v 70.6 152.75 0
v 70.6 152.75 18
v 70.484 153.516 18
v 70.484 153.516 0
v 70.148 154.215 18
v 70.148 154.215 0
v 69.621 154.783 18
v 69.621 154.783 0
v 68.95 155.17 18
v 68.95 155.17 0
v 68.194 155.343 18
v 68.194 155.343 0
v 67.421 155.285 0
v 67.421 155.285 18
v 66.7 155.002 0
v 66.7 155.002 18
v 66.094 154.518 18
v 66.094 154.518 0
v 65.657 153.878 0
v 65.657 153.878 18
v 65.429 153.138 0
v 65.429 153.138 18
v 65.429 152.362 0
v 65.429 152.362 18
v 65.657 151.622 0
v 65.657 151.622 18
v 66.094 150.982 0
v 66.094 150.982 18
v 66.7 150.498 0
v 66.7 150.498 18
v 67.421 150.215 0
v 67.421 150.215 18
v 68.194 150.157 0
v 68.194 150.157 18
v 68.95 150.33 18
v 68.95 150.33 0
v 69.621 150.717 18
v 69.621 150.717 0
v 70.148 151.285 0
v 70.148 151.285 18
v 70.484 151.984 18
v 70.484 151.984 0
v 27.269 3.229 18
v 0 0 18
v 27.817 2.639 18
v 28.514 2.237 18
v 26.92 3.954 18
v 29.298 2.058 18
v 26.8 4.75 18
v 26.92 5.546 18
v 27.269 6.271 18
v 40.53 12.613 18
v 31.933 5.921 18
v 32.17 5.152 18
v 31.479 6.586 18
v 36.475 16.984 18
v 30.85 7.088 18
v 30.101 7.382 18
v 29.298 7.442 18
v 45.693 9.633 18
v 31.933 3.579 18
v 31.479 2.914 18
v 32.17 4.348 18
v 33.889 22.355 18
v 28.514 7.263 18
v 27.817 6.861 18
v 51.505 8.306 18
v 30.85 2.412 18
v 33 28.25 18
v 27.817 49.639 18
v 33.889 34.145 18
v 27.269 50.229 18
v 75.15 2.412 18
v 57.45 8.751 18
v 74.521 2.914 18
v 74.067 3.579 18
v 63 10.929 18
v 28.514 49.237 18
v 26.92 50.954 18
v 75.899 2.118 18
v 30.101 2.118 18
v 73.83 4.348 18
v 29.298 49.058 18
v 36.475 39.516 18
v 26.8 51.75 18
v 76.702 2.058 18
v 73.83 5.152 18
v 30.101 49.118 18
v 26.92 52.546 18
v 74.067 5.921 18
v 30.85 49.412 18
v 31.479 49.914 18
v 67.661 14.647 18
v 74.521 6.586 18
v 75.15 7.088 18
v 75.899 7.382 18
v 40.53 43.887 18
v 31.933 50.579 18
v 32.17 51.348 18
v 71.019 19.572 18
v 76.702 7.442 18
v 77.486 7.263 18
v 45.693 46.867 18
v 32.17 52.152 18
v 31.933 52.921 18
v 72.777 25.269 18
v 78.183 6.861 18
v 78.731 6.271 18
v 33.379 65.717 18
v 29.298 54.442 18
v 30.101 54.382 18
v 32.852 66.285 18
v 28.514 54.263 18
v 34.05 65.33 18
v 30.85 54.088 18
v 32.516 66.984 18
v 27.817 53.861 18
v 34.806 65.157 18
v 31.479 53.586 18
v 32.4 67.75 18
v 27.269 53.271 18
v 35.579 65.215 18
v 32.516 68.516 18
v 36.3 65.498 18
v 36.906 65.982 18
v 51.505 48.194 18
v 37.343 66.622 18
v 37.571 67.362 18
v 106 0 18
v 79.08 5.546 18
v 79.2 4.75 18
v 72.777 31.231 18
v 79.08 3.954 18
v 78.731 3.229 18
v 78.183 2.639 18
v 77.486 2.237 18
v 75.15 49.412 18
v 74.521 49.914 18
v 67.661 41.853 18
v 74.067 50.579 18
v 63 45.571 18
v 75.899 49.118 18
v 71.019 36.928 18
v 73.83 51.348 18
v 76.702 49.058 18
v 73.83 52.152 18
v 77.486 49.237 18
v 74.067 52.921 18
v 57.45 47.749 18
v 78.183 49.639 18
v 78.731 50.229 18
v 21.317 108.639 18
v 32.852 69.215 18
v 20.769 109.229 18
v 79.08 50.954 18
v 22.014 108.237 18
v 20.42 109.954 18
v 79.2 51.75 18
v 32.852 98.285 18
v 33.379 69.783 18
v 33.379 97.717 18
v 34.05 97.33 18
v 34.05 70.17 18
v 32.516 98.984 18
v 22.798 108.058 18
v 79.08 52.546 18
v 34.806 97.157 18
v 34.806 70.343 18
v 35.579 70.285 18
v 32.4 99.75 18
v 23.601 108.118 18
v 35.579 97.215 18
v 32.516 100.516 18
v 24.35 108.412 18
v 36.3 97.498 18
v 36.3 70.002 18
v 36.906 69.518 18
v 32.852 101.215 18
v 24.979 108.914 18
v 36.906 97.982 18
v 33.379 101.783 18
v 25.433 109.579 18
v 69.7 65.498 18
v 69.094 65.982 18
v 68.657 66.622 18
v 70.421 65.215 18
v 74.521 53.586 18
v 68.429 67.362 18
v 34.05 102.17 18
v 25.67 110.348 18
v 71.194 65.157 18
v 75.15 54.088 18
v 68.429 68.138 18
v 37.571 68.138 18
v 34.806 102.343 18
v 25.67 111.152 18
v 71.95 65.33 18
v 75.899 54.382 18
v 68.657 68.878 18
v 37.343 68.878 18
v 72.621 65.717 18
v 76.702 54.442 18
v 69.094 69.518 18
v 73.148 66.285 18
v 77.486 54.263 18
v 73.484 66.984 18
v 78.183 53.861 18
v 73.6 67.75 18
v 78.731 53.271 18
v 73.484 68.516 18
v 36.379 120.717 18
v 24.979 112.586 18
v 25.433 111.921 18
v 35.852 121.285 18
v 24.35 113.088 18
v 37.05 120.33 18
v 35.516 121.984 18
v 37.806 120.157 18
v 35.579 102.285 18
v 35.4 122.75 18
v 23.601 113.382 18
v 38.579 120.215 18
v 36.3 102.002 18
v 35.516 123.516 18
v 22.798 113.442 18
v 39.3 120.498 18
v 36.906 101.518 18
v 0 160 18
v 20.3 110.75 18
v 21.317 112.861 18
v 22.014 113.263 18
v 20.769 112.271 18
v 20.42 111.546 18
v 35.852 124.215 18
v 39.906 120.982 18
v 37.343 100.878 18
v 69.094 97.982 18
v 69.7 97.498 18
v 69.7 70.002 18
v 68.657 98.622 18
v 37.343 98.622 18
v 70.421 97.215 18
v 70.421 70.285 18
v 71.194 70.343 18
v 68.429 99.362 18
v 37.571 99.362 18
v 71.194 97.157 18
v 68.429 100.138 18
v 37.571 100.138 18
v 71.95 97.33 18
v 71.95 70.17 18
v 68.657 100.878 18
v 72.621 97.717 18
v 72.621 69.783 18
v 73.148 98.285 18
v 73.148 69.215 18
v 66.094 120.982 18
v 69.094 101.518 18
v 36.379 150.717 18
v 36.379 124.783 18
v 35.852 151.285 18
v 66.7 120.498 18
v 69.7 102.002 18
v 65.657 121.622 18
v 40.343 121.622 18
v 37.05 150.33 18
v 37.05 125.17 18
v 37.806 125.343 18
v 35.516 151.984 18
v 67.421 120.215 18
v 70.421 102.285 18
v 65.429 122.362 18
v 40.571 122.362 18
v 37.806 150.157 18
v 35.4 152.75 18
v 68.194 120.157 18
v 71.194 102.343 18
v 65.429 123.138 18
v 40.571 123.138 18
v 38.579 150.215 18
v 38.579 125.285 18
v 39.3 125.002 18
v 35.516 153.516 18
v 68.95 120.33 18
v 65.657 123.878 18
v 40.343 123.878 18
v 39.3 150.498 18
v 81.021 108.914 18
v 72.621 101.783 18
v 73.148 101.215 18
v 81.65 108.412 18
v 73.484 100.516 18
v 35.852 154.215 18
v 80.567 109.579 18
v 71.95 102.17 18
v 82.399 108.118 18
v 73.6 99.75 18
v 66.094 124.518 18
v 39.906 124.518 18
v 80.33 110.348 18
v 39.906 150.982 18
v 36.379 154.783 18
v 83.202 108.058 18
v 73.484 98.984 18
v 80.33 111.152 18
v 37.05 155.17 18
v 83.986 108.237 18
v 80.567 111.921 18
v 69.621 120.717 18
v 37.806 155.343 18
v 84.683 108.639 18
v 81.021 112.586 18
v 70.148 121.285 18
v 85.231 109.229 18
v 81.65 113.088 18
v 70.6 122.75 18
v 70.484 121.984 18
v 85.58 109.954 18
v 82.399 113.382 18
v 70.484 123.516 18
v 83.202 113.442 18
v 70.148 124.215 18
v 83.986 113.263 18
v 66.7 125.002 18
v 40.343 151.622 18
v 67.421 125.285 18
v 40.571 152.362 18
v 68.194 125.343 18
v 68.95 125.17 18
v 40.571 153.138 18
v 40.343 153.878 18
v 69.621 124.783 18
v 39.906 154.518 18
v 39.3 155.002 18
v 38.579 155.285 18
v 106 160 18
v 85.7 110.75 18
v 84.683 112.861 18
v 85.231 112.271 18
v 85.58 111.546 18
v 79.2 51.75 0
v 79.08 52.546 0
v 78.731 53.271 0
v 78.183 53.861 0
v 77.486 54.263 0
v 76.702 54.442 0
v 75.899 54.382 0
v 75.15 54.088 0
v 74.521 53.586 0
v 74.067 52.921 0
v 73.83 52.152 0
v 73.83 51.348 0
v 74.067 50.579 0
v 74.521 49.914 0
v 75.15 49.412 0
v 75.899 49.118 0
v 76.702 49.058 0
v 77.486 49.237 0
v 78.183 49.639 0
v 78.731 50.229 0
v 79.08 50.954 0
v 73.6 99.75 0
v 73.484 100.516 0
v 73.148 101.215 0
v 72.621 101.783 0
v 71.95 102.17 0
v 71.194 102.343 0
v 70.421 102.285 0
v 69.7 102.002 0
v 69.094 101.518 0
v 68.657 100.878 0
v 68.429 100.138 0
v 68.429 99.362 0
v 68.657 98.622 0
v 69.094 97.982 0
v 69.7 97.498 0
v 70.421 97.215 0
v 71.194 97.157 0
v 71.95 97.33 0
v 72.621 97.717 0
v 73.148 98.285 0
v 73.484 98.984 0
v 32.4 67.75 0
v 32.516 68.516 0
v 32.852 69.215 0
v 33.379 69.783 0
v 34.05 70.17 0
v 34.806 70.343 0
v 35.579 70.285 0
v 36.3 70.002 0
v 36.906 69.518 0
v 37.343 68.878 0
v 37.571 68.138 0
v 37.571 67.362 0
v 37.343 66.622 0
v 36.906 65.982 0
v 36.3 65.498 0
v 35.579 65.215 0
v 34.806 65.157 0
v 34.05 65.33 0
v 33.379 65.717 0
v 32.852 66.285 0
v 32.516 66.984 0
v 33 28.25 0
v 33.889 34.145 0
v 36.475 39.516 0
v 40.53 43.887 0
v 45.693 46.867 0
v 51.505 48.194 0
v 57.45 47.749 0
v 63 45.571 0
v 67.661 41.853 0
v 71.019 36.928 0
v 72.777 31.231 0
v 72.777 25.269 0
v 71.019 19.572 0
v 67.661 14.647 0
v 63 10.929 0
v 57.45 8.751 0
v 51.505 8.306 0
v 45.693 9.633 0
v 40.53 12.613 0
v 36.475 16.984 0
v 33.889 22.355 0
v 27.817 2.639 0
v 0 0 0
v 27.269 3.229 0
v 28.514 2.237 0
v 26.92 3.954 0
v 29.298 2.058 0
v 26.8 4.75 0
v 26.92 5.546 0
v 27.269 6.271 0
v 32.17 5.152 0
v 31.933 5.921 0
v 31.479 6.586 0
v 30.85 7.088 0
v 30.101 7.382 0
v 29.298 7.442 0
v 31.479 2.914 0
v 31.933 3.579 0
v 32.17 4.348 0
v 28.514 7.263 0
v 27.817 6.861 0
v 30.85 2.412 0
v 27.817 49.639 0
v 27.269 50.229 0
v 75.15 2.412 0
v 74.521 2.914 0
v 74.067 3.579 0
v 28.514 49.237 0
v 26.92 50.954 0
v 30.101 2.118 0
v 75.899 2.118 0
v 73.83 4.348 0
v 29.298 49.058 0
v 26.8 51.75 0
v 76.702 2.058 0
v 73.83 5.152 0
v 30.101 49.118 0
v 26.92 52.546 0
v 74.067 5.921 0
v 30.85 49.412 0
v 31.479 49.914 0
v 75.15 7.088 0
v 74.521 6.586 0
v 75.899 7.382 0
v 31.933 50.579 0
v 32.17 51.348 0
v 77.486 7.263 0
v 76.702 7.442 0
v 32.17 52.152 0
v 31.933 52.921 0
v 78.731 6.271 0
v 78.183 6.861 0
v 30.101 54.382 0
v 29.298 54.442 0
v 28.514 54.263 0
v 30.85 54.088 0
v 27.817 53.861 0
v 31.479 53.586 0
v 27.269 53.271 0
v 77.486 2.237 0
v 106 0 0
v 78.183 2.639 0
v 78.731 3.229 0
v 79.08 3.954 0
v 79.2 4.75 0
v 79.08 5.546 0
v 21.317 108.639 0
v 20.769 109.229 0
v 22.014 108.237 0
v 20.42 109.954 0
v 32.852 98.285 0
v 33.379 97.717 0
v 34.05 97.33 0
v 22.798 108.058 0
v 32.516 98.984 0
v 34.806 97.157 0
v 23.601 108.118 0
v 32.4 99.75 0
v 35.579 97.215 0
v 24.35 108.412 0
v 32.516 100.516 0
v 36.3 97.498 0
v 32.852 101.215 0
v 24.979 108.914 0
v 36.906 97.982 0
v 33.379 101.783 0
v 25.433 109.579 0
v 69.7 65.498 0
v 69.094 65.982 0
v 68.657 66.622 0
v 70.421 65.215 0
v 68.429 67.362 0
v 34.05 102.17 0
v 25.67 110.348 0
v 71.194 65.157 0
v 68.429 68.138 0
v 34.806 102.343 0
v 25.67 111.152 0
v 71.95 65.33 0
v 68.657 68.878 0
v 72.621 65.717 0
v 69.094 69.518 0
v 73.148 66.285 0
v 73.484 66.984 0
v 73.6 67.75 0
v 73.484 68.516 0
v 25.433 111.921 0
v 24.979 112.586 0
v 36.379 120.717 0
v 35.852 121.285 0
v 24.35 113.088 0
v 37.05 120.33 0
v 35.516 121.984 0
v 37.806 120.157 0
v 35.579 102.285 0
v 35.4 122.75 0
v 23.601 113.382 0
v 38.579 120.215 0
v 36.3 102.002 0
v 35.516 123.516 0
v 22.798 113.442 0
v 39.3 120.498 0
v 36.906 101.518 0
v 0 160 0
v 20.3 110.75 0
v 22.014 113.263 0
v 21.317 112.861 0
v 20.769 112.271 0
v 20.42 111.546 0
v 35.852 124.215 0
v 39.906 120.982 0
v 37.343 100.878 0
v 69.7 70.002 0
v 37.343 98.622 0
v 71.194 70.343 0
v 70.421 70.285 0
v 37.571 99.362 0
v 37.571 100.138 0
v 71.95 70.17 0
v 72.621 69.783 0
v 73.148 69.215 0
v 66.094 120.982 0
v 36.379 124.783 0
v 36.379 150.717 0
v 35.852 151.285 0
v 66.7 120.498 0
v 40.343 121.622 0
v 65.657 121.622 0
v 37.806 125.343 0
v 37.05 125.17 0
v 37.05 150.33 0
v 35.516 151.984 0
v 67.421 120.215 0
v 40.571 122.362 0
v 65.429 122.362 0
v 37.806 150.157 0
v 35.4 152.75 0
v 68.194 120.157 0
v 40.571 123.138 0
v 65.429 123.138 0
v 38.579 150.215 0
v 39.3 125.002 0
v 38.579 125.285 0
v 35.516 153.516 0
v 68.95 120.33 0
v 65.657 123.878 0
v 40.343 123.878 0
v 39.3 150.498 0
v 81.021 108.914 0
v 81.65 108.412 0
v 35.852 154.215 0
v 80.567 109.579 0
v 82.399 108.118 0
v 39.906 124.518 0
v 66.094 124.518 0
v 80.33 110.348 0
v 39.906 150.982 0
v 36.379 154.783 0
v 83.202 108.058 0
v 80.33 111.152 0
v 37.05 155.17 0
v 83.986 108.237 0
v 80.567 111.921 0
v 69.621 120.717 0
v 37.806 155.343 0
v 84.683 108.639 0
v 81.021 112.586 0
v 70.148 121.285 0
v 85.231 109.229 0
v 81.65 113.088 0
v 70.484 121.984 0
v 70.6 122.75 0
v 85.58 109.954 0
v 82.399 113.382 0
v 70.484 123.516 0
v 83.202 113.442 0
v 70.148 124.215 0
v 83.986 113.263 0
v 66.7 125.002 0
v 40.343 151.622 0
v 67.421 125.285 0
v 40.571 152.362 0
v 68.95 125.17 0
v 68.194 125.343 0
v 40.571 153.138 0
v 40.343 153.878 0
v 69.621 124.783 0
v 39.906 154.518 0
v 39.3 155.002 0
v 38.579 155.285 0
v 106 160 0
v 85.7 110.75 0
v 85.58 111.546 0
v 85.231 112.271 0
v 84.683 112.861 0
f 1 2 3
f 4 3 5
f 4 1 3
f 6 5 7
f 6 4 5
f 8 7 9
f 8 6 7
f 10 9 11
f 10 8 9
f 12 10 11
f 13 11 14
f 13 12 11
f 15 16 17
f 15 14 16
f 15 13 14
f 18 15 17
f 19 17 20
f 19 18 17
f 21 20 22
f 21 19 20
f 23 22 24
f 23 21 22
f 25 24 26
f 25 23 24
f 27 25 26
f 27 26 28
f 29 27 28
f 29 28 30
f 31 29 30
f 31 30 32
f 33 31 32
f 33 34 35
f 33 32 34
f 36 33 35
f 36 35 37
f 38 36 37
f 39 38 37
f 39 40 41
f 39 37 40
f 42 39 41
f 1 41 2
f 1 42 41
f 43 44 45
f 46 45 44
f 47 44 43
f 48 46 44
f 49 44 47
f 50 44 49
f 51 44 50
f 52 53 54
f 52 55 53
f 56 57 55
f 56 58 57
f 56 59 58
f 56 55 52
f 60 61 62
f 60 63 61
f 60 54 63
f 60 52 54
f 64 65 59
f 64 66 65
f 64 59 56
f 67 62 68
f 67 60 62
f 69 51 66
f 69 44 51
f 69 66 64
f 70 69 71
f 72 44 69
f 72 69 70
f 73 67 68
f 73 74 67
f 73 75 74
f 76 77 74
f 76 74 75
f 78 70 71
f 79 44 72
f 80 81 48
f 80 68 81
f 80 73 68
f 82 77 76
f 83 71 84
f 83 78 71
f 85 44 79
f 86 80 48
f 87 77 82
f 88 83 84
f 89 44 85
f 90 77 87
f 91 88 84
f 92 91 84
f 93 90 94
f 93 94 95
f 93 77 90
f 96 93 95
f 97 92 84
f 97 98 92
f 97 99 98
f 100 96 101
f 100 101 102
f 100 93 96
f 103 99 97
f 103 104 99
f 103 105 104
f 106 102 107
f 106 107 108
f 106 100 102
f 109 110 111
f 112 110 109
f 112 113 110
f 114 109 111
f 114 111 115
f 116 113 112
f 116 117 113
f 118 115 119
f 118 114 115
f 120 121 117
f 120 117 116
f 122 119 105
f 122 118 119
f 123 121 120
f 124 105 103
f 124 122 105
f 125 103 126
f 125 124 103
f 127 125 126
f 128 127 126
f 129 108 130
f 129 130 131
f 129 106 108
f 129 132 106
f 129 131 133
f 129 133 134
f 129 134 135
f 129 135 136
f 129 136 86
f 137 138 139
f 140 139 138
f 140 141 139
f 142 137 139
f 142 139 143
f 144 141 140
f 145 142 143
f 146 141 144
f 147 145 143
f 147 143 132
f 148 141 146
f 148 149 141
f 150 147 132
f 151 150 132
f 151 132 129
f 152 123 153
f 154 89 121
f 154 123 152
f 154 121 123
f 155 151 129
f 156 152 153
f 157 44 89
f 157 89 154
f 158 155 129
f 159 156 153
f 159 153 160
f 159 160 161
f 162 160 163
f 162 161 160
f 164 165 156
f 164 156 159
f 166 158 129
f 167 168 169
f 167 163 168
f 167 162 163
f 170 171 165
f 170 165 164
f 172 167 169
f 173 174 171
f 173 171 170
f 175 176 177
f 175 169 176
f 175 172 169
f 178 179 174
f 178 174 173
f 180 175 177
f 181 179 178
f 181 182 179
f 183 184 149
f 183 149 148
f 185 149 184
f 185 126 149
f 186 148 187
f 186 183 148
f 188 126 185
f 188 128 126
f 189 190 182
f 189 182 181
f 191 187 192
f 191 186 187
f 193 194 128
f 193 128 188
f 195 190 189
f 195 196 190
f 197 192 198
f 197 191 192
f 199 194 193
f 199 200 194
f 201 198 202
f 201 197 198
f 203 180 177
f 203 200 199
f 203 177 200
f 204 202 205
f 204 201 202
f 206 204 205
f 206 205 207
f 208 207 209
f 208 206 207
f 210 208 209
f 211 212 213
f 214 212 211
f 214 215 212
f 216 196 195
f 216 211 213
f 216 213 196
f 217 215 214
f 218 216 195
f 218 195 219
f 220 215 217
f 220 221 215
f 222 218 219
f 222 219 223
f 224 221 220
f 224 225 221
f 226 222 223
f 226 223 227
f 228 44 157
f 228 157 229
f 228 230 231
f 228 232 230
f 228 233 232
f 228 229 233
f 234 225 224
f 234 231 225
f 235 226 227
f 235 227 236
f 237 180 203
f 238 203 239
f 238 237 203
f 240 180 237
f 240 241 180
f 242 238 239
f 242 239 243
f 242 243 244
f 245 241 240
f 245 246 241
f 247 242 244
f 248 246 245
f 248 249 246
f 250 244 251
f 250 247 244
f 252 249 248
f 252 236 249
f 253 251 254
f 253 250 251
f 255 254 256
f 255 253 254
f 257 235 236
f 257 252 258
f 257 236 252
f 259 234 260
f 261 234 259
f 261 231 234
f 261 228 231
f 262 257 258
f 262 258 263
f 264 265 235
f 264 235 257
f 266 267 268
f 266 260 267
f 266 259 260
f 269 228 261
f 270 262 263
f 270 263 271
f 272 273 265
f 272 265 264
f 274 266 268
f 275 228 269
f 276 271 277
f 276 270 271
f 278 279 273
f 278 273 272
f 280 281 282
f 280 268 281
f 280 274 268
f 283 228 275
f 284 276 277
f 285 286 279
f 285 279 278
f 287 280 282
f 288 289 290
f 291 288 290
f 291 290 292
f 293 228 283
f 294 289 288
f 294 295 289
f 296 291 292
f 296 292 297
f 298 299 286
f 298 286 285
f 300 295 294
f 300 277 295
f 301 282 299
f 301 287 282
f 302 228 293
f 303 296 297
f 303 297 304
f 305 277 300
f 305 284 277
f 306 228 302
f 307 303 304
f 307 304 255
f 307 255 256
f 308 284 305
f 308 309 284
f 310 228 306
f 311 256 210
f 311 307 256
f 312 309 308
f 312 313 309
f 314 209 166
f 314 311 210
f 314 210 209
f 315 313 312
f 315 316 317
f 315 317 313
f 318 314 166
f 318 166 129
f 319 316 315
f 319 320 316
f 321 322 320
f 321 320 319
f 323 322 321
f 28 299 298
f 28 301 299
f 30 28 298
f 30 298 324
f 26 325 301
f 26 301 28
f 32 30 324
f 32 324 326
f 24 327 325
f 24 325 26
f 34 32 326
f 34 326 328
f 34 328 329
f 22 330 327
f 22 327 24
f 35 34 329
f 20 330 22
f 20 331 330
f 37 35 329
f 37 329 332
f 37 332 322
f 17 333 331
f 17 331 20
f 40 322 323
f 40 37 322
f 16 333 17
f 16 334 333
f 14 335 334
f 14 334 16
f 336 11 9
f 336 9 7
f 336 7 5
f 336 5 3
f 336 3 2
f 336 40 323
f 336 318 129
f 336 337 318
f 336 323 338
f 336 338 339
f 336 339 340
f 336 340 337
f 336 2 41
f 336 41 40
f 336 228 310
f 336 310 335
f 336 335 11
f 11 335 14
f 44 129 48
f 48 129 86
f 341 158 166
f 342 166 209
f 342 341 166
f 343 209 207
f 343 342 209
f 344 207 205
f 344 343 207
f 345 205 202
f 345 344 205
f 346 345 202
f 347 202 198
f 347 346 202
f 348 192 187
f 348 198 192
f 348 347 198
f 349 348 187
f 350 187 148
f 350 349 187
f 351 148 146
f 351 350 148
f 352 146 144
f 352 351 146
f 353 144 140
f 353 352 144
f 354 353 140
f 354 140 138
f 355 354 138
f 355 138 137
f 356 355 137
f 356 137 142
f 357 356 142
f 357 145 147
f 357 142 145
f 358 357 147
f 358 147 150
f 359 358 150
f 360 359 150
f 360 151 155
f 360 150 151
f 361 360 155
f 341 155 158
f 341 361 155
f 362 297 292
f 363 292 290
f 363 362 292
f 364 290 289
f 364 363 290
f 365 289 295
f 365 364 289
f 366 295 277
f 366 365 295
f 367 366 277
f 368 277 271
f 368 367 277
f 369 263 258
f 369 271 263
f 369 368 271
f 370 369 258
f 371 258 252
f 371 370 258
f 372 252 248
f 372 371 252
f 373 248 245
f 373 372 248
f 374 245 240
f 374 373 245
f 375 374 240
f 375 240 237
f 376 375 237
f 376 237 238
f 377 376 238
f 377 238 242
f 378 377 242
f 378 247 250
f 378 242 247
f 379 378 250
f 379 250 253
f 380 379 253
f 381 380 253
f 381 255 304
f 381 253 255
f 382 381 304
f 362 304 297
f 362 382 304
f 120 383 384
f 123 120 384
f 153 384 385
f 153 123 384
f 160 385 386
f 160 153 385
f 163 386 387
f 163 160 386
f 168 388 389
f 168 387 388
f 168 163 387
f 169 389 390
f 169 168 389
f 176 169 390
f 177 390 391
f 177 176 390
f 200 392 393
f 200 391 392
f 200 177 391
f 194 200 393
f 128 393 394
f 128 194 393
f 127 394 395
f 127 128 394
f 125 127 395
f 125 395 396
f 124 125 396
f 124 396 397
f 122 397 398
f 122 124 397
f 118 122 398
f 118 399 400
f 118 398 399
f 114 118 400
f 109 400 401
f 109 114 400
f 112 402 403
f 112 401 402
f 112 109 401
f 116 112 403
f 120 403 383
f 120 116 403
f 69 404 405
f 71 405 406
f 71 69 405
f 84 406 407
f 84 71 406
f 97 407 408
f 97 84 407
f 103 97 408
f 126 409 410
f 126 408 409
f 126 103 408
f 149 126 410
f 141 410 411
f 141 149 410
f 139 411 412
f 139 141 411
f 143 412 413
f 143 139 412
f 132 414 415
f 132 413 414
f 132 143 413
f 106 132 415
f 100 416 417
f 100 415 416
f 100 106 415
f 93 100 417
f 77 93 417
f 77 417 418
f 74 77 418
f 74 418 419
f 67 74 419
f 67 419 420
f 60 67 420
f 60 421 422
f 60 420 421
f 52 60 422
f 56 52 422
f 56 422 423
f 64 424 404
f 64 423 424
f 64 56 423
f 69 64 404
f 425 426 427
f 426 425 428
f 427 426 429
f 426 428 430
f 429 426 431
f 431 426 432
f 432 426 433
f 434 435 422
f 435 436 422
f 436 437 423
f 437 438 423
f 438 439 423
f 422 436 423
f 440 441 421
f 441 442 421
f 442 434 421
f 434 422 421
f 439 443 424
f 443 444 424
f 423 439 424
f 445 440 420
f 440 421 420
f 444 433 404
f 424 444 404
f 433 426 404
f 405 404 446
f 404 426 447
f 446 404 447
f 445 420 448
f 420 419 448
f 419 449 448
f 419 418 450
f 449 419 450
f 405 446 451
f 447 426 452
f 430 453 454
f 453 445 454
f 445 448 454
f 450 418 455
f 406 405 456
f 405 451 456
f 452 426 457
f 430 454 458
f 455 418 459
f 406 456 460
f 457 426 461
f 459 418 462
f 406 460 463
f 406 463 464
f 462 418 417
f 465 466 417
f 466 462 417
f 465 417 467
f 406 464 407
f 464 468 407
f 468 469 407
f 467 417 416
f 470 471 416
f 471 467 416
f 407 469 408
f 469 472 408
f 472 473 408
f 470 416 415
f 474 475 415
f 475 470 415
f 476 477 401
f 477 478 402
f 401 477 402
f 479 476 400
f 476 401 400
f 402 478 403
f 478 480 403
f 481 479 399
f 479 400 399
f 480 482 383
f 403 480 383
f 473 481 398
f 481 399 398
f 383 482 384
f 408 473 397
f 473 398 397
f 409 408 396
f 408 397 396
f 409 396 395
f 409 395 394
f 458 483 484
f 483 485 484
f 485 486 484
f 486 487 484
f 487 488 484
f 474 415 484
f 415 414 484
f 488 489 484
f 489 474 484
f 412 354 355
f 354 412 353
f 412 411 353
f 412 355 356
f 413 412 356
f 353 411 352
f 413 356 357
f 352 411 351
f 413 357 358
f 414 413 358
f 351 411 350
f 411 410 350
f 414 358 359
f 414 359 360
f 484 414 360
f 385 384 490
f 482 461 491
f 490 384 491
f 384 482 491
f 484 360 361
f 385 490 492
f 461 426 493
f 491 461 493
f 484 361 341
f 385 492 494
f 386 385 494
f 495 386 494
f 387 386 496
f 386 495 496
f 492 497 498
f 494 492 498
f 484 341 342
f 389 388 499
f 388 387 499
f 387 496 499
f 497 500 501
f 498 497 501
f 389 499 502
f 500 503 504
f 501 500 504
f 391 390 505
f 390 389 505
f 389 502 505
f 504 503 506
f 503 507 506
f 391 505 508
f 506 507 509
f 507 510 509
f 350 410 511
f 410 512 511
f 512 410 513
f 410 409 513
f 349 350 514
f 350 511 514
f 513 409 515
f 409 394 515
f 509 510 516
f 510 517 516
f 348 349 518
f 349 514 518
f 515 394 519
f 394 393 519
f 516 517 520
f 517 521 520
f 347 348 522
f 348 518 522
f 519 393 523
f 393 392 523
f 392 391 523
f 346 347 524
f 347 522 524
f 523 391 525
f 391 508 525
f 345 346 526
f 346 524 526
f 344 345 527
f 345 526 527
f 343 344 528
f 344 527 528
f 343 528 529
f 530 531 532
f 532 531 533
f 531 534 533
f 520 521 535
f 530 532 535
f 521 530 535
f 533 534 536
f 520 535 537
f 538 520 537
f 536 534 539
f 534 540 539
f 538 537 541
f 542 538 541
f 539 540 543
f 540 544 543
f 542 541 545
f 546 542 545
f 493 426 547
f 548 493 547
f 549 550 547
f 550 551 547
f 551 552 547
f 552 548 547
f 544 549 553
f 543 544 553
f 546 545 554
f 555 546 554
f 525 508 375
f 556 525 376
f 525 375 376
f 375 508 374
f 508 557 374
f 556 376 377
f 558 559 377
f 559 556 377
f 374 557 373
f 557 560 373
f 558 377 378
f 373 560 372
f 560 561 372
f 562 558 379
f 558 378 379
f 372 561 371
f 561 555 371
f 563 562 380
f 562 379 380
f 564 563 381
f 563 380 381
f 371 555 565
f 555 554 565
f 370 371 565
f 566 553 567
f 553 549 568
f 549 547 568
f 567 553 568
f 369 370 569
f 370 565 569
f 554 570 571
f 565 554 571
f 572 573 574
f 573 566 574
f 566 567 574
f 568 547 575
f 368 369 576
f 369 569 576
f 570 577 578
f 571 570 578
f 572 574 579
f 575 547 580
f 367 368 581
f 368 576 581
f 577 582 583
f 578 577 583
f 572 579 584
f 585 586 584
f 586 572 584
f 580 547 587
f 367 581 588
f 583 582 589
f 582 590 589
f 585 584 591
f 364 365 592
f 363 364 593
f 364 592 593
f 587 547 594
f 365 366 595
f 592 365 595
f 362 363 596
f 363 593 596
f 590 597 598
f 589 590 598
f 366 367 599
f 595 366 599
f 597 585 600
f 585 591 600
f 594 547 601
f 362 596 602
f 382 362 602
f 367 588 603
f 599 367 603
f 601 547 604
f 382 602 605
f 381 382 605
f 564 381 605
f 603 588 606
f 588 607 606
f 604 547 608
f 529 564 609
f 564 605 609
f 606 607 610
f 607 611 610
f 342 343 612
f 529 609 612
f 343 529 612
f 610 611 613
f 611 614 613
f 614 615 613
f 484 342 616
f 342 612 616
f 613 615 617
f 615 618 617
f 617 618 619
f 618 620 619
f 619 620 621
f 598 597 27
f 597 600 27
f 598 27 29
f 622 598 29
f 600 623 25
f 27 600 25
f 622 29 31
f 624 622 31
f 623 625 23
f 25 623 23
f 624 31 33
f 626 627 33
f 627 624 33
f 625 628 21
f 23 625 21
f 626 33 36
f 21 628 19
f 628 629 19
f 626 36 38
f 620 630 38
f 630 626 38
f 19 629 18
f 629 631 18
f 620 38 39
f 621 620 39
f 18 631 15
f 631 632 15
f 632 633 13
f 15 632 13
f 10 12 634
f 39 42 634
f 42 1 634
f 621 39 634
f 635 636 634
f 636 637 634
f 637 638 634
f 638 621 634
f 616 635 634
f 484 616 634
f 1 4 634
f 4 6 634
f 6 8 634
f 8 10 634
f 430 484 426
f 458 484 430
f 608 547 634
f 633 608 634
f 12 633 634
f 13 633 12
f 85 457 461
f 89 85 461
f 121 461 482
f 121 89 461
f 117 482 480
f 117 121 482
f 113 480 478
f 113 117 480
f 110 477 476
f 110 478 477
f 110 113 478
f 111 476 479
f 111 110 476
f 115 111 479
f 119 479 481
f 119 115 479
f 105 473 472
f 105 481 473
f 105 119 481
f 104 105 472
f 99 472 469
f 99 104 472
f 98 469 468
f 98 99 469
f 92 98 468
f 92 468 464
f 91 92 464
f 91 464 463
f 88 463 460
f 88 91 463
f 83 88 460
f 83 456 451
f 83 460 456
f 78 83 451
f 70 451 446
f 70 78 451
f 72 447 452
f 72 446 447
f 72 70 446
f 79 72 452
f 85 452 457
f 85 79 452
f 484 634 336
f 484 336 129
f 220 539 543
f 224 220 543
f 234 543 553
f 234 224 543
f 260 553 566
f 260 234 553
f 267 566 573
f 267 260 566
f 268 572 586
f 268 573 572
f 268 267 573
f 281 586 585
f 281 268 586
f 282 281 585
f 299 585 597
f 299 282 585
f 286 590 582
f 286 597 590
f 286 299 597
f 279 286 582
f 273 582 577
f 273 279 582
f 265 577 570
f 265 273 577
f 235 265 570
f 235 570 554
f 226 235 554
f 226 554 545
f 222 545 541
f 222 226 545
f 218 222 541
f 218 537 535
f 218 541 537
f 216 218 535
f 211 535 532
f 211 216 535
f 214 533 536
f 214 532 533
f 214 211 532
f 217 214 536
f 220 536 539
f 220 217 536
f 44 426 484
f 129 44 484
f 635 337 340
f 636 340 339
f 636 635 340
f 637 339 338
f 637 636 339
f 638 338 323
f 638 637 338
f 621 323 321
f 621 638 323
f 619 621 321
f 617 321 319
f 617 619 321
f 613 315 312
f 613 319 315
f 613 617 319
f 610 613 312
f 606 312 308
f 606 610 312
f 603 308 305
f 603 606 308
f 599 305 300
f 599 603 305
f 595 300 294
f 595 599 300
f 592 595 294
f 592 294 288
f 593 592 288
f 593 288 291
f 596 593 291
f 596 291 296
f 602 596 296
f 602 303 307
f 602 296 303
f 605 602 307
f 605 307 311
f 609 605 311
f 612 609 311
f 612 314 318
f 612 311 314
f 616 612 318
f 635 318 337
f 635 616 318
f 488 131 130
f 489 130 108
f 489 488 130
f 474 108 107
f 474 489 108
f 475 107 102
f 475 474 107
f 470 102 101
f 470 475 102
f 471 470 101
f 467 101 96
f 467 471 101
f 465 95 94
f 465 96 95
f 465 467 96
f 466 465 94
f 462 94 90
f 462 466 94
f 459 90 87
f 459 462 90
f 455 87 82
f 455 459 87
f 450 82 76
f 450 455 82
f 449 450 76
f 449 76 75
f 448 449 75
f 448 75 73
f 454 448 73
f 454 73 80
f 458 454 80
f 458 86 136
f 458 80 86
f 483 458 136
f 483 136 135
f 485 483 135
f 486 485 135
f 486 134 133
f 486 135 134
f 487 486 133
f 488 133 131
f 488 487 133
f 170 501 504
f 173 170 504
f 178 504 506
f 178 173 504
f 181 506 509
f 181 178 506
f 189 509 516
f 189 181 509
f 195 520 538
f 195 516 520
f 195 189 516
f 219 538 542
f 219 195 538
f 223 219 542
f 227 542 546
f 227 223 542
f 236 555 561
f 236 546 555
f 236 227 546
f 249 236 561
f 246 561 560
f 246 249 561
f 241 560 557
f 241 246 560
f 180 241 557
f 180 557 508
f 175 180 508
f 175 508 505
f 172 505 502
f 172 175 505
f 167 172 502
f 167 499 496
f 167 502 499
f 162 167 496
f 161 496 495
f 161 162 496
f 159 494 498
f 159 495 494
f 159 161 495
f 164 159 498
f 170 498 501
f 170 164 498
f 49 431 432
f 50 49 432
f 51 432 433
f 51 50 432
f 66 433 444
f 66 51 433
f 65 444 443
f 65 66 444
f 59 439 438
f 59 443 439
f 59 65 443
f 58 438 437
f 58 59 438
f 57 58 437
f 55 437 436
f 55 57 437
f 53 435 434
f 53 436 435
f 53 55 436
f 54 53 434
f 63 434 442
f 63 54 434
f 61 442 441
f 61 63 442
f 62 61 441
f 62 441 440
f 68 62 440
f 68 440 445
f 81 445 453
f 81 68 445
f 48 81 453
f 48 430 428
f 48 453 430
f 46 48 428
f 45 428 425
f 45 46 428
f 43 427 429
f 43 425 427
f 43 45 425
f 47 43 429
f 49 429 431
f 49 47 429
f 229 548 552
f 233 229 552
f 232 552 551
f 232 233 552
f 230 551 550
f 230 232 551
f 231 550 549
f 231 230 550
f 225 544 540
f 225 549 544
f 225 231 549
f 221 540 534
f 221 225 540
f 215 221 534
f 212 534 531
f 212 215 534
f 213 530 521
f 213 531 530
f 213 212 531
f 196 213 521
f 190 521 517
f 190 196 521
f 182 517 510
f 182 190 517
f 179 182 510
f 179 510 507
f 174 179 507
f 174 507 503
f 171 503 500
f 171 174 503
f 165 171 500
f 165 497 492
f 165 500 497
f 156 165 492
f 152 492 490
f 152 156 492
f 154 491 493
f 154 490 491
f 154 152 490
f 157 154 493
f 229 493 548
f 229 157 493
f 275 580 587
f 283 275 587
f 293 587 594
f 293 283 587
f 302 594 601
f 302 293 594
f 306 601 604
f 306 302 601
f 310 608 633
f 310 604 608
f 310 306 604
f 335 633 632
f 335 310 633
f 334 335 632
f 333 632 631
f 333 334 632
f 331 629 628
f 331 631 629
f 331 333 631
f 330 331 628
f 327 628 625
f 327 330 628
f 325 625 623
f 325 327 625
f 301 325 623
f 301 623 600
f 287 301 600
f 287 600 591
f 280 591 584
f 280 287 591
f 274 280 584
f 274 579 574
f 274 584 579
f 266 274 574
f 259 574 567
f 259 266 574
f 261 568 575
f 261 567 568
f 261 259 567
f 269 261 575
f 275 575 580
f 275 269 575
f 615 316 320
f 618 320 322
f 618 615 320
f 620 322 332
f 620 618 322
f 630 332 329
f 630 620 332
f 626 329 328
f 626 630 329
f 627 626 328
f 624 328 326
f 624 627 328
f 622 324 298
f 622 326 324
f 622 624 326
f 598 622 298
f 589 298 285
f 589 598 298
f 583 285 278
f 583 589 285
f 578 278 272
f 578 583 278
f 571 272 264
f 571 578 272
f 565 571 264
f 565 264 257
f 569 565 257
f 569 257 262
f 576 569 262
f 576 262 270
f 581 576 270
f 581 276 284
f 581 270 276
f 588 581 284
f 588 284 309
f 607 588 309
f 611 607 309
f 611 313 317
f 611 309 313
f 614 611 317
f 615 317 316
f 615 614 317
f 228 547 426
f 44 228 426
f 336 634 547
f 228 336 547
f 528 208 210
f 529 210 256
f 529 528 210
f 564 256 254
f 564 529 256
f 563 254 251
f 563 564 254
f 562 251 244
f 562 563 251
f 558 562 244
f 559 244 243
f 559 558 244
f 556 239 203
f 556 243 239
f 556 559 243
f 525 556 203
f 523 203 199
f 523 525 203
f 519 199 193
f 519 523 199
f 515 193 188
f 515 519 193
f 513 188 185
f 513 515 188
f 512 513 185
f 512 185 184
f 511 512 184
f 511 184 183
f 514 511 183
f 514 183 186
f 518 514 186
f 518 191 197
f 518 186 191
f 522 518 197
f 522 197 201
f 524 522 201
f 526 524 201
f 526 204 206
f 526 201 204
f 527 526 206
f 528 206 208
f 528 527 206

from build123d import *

# Parameters (mm, degrees)
PAD_DEPTH            = 18
SKETCH_R             = 2.6
POCKET_DEPTH         = 339.017224
POCKET_DEPTH_BACK    = 357.017224
SKETCH001_R          = 2.6
POCKET001_DEPTH      = 339.017224
POCKET001_DEPTH_BACK = 357.017224
SKETCH002_R          = 20
POCKET002_DEPTH      = 339.017224
POCKET002_DEPTH_BACK = 357.017224
SKETCH004_R          = 2.7
POCKET003_DEPTH      = 339.017224
POCKET003_DEPTH_BACK = 357.017224
SKETCH005_R          = 2.7
POCKET004_DEPTH      = 339.017224
POCKET004_DEPTH_BACK = 357.017224


with BuildPart() as part:
    # Sketch003 → Pad (new body)
    with BuildSketch(Plane.XY):
        Polygon((0, 92.25), (53, 92.25), (53, -67.75), (0, -67.75), (0, 0), align=None)
    pad = extrude(amount=PAD_DEPTH)

    # Sketch → Pocket (cut, two sides)
    with BuildSketch(Plane(origin=(18, 0, 0), x_dir=(1, 0, 0), z_dir=(0, 0, 1))) as pocket_sk:
        Circle(SKETCH_R)
        with Locations((0, 32)):
            Circle(SKETCH_R)
    pocket = extrude(amount=-POCKET_DEPTH, mode=Mode.SUBTRACT) + extrude(pocket_sk.sketch, amount=POCKET_DEPTH_BACK, mode=Mode.SUBTRACT)

    # Sketch001 → Pocket001 (cut, two sides)
    with BuildSketch(Plane(origin=(15, 55, 0), x_dir=(1, 0, 0), z_dir=(0, 0, 1))) as pocket001_sk:
        Circle(SKETCH001_R)
        with Locations((0, 30)):
            Circle(SKETCH001_R)
    pocket001 = extrude(amount=-POCKET001_DEPTH, mode=Mode.SUBTRACT) + extrude(pocket001_sk.sketch, amount=POCKET001_DEPTH_BACK, mode=Mode.SUBTRACT)

    # Sketch002 → Pocket002 (cut, two sides)
    with BuildSketch(Plane(origin=(0, -39.5, 0), x_dir=(1, 0, 0), z_dir=(0, 0, 1))) as pocket002_sk:
        Circle(SKETCH002_R)
    pocket002 = extrude(amount=-POCKET002_DEPTH, mode=Mode.SUBTRACT) + extrude(pocket002_sk.sketch, amount=POCKET002_DEPTH_BACK, mode=Mode.SUBTRACT)

    # Sketch004 → Pocket003 (cut, two sides)
    with BuildSketch(Plane(origin=(23.5, -39.5, 0), x_dir=(1, 0, 0), z_dir=(0, 0, 1))) as pocket003_sk:
        with Locations((0, 23.5)):
            Circle(SKETCH004_R)
        with Locations((0, -23.5)):
            Circle(SKETCH004_R)
    pocket003 = extrude(amount=-POCKET003_DEPTH, mode=Mode.SUBTRACT) + extrude(pocket003_sk.sketch, amount=POCKET003_DEPTH_BACK, mode=Mode.SUBTRACT)

    # Sketch005 → Pocket004 (cut, two sides)
    with BuildSketch(Plane(origin=(30, 43, 0), x_dir=(1, 0, 0), z_dir=(0, 0, 1))) as pocket004_sk:
        Circle(SKETCH005_R)
    pocket004 = extrude(amount=-POCKET004_DEPTH, mode=Mode.SUBTRACT) + extrude(pocket004_sk.sketch, amount=POCKET004_DEPTH_BACK, mode=Mode.SUBTRACT)

    # Mirrored: Pad, Pocket, Pocket001, Pocket002, Pocket003, Pocket004 across Sketch003 V_Axis
    add(pad.mirror(Plane(origin=(0, 0, 0), x_dir=(0, 0, 1), z_dir=(1, 0, 0))))
    add(pocket.mirror(Plane(origin=(0, 0, 0), x_dir=(0, 0, 1), z_dir=(1, 0, 0))), mode=Mode.SUBTRACT)
    add(pocket001.mirror(Plane(origin=(0, 0, 0), x_dir=(0, 0, 1), z_dir=(1, 0, 0))), mode=Mode.SUBTRACT)
    add(pocket002.mirror(Plane(origin=(0, 0, 0), x_dir=(0, 0, 1), z_dir=(1, 0, 0))), mode=Mode.SUBTRACT)
    add(pocket003.mirror(Plane(origin=(0, 0, 0), x_dir=(0, 0, 1), z_dir=(1, 0, 0))), mode=Mode.SUBTRACT)
    add(pocket004.mirror(Plane(origin=(0, 0, 0), x_dir=(0, 0, 1), z_dir=(1, 0, 0))), mode=Mode.SUBTRACT)


with BuildPart() as part_1:
    # Clone placement: moved
    add(part.part.moved(Location((53, 67.75, 0))))


solid = part_1.part
